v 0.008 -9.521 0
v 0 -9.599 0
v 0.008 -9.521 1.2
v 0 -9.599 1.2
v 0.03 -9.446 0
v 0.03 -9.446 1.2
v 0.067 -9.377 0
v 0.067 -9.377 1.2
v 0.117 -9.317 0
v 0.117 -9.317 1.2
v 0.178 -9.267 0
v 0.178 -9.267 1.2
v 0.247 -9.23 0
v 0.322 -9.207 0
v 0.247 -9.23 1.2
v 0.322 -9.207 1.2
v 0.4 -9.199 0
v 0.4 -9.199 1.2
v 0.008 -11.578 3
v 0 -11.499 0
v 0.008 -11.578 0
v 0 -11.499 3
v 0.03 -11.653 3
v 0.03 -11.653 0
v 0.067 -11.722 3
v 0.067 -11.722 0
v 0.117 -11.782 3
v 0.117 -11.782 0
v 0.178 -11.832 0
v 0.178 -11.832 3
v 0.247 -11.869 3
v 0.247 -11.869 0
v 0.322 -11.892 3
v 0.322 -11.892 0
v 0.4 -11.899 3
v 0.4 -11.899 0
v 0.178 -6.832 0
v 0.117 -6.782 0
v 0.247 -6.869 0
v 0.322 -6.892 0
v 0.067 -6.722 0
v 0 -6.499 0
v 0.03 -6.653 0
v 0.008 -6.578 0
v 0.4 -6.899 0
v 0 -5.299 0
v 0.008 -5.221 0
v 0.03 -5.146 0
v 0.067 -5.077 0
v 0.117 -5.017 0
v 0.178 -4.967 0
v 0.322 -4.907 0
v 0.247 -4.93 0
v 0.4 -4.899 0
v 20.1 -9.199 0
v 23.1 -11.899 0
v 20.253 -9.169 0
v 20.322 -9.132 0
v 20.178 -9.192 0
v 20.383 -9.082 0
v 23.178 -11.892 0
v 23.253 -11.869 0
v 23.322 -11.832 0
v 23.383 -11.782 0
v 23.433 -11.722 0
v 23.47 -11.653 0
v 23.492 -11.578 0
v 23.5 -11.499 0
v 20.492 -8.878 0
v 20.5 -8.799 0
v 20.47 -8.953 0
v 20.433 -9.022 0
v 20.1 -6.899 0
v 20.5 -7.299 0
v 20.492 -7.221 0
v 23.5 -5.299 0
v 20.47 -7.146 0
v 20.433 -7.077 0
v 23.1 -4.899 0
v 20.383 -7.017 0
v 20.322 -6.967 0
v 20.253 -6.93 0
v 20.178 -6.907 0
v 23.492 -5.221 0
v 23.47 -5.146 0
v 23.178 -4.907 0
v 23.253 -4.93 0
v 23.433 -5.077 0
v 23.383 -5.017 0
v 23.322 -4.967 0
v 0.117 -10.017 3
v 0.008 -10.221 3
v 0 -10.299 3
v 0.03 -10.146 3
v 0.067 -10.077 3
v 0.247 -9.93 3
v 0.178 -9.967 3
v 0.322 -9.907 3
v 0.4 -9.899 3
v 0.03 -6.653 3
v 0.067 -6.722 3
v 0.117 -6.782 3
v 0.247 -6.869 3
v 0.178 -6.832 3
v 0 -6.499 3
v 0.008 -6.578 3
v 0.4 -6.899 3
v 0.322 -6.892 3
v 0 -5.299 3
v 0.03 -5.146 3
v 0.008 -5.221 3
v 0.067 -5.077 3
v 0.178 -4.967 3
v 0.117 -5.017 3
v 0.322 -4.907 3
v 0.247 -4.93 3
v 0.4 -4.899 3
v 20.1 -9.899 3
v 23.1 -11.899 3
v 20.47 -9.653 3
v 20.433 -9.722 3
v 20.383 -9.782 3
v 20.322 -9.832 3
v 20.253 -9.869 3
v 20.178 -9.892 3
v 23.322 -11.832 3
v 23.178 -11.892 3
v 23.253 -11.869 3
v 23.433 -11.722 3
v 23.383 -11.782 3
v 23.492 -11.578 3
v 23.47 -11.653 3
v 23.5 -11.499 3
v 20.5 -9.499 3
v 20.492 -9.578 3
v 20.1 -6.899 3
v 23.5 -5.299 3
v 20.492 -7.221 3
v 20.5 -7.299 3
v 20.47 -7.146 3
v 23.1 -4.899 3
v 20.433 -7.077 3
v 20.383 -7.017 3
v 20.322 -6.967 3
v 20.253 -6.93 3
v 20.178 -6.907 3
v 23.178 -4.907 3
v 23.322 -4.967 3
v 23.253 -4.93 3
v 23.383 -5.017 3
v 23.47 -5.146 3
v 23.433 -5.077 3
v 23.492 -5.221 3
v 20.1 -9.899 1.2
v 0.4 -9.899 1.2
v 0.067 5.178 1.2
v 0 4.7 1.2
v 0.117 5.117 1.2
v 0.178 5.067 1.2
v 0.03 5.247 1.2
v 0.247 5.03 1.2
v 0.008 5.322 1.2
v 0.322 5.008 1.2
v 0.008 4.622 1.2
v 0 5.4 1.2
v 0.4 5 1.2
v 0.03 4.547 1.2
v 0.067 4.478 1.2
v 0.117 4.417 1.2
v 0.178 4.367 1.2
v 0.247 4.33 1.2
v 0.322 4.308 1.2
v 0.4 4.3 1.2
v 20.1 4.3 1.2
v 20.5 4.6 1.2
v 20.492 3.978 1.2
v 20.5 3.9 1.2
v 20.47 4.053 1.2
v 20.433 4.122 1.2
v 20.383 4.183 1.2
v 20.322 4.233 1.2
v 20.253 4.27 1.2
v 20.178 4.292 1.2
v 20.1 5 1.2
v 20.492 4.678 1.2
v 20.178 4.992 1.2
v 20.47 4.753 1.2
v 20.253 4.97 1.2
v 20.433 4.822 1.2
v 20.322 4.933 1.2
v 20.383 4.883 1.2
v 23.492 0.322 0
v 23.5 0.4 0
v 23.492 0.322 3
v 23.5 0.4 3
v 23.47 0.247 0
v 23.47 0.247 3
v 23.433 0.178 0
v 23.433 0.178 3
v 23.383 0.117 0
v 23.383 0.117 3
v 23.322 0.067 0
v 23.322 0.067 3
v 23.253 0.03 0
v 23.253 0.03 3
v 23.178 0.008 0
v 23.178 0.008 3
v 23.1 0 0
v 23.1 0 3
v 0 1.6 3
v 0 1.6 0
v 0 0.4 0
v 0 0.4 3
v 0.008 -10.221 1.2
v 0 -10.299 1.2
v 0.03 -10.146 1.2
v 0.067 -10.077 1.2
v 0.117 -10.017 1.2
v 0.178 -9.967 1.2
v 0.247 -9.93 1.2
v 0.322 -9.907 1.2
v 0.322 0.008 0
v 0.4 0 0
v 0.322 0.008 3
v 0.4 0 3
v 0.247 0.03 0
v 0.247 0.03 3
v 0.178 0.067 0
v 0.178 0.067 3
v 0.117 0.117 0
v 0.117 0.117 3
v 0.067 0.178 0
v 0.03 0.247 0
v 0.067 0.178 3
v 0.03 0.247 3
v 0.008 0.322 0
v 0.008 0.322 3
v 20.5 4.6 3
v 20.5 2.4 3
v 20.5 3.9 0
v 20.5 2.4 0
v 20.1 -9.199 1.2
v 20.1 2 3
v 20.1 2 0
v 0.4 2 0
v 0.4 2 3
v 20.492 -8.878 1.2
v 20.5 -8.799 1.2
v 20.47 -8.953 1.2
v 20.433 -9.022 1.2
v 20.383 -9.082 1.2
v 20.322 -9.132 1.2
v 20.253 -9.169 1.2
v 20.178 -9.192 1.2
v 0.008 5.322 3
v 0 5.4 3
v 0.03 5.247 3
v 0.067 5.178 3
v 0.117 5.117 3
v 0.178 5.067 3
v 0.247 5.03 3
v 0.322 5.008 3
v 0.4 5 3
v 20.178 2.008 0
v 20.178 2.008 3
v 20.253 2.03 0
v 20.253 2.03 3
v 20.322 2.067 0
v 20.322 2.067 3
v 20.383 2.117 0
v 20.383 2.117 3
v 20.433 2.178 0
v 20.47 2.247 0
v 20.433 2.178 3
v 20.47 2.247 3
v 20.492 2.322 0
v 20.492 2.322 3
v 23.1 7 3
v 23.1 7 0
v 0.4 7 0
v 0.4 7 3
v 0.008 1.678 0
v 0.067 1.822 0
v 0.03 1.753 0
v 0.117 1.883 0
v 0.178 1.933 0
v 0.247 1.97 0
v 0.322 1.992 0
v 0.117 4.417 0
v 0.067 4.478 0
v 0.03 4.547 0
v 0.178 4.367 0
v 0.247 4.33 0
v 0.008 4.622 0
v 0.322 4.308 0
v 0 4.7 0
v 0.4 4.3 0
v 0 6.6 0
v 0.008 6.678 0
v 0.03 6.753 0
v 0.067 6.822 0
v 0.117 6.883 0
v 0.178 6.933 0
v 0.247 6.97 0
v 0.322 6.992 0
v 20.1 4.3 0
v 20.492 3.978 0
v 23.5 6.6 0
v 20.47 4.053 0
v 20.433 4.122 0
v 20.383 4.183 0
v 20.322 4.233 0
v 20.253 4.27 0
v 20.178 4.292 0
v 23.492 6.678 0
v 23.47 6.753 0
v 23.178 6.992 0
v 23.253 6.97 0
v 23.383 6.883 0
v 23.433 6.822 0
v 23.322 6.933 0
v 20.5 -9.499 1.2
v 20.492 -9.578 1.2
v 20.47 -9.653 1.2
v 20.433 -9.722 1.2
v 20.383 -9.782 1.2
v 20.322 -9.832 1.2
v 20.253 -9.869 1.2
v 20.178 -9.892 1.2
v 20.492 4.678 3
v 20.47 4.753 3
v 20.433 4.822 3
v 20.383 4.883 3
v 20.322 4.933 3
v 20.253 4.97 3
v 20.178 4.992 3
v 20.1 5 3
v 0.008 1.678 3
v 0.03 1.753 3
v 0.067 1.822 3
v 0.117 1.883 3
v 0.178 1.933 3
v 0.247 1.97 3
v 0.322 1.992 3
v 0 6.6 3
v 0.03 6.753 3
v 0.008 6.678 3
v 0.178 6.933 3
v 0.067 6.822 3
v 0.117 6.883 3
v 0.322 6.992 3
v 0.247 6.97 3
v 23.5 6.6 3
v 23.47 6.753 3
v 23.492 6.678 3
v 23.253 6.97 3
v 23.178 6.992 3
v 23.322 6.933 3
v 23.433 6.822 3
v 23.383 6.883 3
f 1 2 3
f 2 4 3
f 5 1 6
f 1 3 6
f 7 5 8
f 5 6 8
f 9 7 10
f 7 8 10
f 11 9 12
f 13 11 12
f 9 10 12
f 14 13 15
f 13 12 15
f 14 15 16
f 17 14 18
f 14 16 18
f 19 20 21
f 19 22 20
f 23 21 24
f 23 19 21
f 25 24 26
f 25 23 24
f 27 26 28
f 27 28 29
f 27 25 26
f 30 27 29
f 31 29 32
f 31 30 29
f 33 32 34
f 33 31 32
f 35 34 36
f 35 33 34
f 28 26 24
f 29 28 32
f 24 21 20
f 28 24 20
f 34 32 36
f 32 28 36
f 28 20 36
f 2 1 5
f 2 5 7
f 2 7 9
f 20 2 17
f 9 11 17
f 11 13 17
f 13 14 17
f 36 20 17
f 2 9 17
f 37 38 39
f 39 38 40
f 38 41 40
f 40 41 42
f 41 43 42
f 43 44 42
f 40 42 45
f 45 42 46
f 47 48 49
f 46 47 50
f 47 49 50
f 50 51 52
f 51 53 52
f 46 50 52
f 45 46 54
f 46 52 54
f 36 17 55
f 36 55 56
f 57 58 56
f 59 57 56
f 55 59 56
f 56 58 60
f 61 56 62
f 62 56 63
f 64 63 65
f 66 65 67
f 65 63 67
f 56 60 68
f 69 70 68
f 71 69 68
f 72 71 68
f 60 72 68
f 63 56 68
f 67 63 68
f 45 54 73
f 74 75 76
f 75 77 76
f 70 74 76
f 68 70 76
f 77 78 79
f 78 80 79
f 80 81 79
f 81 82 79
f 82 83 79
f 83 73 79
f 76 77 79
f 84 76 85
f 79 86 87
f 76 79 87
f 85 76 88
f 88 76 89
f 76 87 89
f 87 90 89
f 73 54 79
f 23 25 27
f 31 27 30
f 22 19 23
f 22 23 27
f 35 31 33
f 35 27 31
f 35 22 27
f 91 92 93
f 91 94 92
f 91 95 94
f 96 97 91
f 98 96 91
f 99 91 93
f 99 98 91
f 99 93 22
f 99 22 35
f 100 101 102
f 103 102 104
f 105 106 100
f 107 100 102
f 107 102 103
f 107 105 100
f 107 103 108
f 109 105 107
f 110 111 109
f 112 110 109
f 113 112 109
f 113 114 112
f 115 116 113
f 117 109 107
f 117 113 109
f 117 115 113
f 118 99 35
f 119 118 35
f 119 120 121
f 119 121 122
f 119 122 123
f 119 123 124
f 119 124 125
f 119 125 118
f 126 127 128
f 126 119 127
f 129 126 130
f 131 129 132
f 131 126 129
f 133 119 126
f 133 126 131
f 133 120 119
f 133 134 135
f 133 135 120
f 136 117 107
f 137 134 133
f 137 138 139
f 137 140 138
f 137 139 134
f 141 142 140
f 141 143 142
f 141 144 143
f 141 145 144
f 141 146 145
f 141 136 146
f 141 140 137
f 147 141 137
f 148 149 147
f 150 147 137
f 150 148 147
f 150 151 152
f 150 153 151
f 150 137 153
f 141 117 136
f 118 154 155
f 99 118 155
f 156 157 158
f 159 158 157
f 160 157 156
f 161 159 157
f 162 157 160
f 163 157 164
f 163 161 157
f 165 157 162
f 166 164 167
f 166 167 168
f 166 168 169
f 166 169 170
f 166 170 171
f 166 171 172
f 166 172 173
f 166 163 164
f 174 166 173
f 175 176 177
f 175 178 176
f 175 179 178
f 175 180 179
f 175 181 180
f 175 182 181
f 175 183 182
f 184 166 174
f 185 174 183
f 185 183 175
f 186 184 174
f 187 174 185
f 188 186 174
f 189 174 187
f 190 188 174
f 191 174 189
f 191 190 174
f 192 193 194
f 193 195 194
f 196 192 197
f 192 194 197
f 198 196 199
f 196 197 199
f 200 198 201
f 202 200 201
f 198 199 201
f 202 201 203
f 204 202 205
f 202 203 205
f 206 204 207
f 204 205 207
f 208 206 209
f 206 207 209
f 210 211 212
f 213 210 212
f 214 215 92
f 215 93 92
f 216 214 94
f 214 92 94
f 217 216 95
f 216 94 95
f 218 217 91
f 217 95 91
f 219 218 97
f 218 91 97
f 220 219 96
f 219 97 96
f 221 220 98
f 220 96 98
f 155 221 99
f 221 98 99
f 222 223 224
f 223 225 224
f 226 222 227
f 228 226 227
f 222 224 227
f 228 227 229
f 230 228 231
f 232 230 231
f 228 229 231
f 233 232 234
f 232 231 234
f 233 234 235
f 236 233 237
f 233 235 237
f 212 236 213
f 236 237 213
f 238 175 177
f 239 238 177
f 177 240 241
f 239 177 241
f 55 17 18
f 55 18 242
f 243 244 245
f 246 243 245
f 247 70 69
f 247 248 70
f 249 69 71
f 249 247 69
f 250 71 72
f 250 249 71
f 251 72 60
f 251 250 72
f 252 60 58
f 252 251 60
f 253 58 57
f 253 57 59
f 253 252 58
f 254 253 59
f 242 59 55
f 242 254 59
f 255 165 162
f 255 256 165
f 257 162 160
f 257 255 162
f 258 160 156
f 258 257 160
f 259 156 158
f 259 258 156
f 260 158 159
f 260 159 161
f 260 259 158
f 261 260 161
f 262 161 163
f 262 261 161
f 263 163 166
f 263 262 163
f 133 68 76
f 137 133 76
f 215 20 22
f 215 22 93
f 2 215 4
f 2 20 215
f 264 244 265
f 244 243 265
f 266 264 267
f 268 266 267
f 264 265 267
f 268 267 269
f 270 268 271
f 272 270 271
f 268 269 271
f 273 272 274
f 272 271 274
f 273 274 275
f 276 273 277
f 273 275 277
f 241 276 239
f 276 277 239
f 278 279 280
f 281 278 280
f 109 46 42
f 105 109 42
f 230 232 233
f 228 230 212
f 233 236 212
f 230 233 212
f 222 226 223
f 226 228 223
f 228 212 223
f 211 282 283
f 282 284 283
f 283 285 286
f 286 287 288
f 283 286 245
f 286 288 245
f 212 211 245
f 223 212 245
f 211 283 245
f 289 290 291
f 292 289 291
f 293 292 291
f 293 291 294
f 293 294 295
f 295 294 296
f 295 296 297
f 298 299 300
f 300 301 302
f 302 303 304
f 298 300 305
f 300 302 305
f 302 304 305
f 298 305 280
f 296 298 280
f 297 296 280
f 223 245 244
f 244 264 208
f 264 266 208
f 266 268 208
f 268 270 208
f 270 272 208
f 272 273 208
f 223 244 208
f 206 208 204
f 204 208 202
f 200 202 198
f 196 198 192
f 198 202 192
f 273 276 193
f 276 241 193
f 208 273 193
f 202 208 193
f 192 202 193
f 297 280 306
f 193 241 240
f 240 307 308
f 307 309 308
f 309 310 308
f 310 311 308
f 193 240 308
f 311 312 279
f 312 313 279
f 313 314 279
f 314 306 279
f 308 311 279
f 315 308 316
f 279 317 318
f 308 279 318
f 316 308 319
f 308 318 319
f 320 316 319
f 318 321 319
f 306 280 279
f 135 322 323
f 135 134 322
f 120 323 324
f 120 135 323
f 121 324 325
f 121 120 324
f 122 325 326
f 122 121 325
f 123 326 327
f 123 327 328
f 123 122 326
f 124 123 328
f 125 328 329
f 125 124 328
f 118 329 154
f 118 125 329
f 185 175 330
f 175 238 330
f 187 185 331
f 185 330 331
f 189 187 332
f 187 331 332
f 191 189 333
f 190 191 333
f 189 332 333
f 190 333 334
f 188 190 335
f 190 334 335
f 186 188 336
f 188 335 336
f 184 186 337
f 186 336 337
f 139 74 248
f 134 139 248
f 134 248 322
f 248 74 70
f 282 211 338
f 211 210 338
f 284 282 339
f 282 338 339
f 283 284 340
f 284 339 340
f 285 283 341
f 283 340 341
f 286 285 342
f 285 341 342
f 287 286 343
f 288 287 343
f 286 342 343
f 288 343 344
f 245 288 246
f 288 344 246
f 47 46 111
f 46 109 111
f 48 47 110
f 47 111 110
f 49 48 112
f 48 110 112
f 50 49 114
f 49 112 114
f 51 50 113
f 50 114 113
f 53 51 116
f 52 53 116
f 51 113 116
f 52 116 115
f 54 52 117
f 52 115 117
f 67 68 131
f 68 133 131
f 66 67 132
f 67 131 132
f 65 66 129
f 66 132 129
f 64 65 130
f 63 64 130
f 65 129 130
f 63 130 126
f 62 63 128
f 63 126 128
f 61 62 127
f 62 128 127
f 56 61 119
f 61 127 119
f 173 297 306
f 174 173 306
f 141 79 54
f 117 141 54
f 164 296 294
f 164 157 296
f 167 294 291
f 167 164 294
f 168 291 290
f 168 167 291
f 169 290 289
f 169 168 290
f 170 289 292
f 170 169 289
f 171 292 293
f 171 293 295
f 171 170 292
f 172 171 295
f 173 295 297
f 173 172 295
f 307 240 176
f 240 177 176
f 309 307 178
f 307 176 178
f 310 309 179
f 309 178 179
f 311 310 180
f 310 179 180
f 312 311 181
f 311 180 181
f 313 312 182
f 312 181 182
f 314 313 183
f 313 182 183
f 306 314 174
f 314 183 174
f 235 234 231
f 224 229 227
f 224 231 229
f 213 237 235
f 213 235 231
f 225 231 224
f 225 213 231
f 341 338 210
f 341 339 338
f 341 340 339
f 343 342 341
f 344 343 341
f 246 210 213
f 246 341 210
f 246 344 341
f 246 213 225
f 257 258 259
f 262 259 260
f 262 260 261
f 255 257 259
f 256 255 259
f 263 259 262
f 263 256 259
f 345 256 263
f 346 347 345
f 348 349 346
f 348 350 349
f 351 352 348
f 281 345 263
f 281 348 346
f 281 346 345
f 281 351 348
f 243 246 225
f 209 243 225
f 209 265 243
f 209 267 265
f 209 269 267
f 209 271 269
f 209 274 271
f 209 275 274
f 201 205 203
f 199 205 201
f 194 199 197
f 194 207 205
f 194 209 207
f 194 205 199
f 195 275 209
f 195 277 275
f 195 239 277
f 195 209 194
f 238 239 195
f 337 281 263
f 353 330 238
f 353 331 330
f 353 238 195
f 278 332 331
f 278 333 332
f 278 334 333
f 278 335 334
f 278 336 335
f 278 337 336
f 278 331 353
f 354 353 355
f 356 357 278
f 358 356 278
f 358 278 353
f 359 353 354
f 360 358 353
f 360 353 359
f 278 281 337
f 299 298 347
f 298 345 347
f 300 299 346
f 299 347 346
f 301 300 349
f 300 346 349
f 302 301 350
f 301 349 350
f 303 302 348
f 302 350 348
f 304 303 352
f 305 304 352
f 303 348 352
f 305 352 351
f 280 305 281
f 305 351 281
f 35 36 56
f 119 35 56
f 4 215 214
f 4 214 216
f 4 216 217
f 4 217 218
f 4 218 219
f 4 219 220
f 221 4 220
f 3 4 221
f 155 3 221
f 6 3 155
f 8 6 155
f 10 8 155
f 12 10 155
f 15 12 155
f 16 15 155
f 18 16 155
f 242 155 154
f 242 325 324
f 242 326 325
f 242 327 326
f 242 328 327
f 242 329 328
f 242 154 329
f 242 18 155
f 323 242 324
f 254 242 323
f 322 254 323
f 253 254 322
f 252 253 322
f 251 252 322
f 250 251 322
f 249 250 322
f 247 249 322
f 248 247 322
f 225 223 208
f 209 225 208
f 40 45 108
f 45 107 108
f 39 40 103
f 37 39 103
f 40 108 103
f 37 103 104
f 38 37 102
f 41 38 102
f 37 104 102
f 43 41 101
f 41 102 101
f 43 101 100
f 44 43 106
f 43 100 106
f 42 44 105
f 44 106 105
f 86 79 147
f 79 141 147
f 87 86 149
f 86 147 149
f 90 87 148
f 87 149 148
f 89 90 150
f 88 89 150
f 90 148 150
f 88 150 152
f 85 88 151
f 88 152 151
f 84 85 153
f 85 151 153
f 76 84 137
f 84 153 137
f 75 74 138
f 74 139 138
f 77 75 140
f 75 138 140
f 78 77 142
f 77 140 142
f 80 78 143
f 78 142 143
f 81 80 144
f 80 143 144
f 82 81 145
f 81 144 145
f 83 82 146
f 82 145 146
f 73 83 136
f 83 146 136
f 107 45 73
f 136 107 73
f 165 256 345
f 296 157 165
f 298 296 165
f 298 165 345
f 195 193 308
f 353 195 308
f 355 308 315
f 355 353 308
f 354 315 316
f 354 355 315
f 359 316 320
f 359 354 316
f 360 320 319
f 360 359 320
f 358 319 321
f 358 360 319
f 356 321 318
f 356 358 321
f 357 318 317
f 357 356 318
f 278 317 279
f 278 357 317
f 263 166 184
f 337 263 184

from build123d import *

# Parameters (mm, degrees)
BOSS_EXTRUDE1_DEPTH   = 3
BOSS_EXTRUDE1_2_DEPTH = 3
SKETCH2_4_W           = 20.5
SKETCH2_4_H           = 0.7
BOSS_EXTRUDE3_DEPTH   = 1.2
FILLET2_R             = 0.4
FILLET3_R             = 0.4


with BuildPart() as part:
    # Sketch2 → Boss-Extrude1 (new body)
    with BuildSketch(Plane.XY):
        Polygon((0, 2), (0, 0), (23.5, 0), (23.5, 7), (0, 7), (0, 5), (20.5, 5), (20.5, 2), align=None)
    extrude(amount=BOSS_EXTRUDE1_DEPTH)



with BuildPart() as body_2:
    # Sketch2 → Boss-Extrude1 2 (new body)
    with BuildSketch(Plane.XY):
        Polygon((20.5, -6.899471306), (20.5, -9.899471306), (0, -9.899471306), (0, -11.899471306), (23.5, -11.899471306), (23.5, -4.899471306), (0, -4.899471306), (0, -6.899471306), align=None)
    extrude(amount=BOSS_EXTRUDE1_2_DEPTH)


with BuildPart() as part_1:
    add(part.part)

    add(body_2.part)  # Boss-Extrude3 merges body 2
    # Sketch2<4> → Boss-Extrude3 (add)
    with BuildSketch(Plane.XY):
        with Locations((10.25, 4.65)):
            Rectangle(SKETCH2_4_W, SKETCH2_4_H)
        with Locations((10.25, -9.549471306)):
            Rectangle(SKETCH2_4_W, SKETCH2_4_H)
    extrude(amount=BOSS_EXTRUDE3_DEPTH)

    # Fillet2
    fillet2_edges = [part_1.edges().sort_by_distance(p)[0] for p in [
        (0, 5, 2.1),
        (20.5, 2, 1.5),
        (20.5, 4.3, 0.6),
        (20.5, 5, 2.1),
        (23.5, 7, 1.5),
        (23.5, 0, 1.5),
        (0, 0, 1.5),
        (0, 2, 1.5),
        (0, 4.3, 0.6),
        (0, 7, 1.5),
    ]]
    fillet(fillet2_edges, radius=FILLET2_R)

    # Fillet3
    fillet3_edges = [part_1.edges().sort_by_distance(p)[0] for p in [
        (23.5, -11.899471306, 1.5),
        (23.5, -4.899471306, 1.5),
        (20.5, -6.899471306, 1.5),
        (20.5, -9.899471306, 2.1),
        (20.5, -9.199471306, 0.6),
        (0, -11.899471306, 1.5),
        (0, -9.899471306, 2.1),
        (0, -9.199471306, 0.6),
        (0, -4.899471306, 1.5),
        (0, -6.899471306, 1.5),
    ]]
    fillet(fillet3_edges, radius=FILLET3_R)


solid = part_1.part
